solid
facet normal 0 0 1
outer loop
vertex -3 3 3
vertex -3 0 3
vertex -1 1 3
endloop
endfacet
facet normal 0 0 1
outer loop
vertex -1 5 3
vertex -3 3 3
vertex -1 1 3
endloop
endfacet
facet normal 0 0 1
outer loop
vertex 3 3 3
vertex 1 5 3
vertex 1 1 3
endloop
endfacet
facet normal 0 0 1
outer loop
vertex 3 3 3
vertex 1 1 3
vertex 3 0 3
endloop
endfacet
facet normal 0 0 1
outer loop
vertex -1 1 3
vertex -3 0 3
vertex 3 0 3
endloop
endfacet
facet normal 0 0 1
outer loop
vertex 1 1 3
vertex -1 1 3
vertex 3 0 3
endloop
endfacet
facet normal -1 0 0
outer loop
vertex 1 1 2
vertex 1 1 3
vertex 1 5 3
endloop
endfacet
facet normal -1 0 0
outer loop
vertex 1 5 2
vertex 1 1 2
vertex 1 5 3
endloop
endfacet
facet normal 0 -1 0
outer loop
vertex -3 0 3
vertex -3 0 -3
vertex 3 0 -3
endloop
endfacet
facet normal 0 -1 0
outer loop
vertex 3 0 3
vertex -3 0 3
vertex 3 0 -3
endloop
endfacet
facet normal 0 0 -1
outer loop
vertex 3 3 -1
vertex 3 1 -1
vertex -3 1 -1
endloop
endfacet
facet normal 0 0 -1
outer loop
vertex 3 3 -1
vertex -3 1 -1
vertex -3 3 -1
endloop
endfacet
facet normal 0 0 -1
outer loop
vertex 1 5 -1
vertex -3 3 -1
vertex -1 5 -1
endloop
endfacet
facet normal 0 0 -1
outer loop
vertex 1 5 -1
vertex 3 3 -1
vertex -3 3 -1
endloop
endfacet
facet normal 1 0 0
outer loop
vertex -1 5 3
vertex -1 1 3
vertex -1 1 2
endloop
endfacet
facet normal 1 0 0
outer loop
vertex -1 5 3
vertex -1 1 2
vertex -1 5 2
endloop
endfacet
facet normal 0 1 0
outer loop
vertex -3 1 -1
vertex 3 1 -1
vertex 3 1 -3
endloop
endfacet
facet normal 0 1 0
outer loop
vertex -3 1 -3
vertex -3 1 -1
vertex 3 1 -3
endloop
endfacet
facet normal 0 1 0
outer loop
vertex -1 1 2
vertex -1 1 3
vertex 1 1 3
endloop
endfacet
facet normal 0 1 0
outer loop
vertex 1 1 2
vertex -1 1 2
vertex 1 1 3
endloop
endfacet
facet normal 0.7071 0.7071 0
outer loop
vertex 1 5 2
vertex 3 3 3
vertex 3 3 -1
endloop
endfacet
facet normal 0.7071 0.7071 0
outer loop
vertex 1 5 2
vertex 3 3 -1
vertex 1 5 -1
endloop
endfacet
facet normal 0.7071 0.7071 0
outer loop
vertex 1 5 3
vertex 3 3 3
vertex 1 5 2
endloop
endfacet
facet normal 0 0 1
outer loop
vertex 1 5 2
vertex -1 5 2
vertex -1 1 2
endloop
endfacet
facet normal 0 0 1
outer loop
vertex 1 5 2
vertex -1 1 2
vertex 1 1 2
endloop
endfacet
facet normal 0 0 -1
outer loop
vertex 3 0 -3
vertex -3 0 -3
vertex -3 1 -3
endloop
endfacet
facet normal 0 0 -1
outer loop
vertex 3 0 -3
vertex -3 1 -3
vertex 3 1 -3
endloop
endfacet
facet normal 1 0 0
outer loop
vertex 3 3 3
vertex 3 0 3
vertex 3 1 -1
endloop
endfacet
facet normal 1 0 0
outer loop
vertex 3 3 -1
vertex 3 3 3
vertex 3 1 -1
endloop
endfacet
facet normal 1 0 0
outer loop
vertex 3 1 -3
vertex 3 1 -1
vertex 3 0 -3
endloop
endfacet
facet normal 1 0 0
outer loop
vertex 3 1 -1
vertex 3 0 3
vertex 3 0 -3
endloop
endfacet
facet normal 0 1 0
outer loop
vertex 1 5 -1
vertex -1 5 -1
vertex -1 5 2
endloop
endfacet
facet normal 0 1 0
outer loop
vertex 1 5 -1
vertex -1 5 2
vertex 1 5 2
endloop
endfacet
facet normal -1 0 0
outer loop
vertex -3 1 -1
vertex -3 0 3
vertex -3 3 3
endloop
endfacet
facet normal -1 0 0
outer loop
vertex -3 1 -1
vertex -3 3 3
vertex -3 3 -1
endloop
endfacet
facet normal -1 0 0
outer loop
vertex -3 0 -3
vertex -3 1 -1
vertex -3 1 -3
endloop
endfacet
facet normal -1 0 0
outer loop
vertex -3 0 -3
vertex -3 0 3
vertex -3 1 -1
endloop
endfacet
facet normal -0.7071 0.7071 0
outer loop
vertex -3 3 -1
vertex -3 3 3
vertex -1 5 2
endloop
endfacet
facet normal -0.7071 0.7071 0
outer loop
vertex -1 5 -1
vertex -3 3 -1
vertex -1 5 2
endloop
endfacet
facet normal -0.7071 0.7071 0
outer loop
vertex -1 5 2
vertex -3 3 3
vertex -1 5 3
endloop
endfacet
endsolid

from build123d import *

# Parameters (mm, degrees)
SKETCH2_W           = 6
SKETCH2_H           = 6
BOSS_EXTRUDE1_DEPTH = 5
SKETCH3_W           = 2
SKETCH3_H           = 4
CUT_EXTRUDE1_DEPTH  = 8
CUT_EXTRUDE2_DEPTH  = 8
SKETCH5_W           = 2
SKETCH5_H           = 4
CUT_EXTRUDE3_DEPTH  = 1


with BuildPart() as part:
    # Sketch2 → Boss-Extrude1 (new body)
    with BuildSketch(Plane(origin=(0, 0, 0), x_dir=(1, 0, 0), z_dir=(0, 1, 0))):
        Rectangle(SKETCH2_W, SKETCH2_H)
    extrude(amount=BOSS_EXTRUDE1_DEPTH)

    # Sketch3 → Cut-Extrude1 (cut)
    with BuildSketch(Plane(origin=(3, 0, 0), x_dir=(0, 0, -1), z_dir=(1, 0, 0))):
        with Locations((2, 3)):
            Rectangle(SKETCH3_W, SKETCH3_H)
    extrude(amount=-CUT_EXTRUDE1_DEPTH, mode=Mode.SUBTRACT)

    # Sketch4 → Cut-Extrude2 (cut)
    with BuildSketch(Plane.XY.offset(3)):
        Polygon((-3, 3), (-1, 5), (-3, 5), align=None)
        Polygon((1, 5), (3, 5), (3, 3), align=None)
    extrude(amount=-CUT_EXTRUDE2_DEPTH, mode=Mode.SUBTRACT)

    # Sketch5 → Cut-Extrude3 (cut)
    with BuildSketch(Plane.XY.offset(3)):
        with Locations((0, 3)):
            Rectangle(SKETCH5_W, SKETCH5_H)
    extrude(amount=-CUT_EXTRUDE3_DEPTH, mode=Mode.SUBTRACT)


solid = part.part
